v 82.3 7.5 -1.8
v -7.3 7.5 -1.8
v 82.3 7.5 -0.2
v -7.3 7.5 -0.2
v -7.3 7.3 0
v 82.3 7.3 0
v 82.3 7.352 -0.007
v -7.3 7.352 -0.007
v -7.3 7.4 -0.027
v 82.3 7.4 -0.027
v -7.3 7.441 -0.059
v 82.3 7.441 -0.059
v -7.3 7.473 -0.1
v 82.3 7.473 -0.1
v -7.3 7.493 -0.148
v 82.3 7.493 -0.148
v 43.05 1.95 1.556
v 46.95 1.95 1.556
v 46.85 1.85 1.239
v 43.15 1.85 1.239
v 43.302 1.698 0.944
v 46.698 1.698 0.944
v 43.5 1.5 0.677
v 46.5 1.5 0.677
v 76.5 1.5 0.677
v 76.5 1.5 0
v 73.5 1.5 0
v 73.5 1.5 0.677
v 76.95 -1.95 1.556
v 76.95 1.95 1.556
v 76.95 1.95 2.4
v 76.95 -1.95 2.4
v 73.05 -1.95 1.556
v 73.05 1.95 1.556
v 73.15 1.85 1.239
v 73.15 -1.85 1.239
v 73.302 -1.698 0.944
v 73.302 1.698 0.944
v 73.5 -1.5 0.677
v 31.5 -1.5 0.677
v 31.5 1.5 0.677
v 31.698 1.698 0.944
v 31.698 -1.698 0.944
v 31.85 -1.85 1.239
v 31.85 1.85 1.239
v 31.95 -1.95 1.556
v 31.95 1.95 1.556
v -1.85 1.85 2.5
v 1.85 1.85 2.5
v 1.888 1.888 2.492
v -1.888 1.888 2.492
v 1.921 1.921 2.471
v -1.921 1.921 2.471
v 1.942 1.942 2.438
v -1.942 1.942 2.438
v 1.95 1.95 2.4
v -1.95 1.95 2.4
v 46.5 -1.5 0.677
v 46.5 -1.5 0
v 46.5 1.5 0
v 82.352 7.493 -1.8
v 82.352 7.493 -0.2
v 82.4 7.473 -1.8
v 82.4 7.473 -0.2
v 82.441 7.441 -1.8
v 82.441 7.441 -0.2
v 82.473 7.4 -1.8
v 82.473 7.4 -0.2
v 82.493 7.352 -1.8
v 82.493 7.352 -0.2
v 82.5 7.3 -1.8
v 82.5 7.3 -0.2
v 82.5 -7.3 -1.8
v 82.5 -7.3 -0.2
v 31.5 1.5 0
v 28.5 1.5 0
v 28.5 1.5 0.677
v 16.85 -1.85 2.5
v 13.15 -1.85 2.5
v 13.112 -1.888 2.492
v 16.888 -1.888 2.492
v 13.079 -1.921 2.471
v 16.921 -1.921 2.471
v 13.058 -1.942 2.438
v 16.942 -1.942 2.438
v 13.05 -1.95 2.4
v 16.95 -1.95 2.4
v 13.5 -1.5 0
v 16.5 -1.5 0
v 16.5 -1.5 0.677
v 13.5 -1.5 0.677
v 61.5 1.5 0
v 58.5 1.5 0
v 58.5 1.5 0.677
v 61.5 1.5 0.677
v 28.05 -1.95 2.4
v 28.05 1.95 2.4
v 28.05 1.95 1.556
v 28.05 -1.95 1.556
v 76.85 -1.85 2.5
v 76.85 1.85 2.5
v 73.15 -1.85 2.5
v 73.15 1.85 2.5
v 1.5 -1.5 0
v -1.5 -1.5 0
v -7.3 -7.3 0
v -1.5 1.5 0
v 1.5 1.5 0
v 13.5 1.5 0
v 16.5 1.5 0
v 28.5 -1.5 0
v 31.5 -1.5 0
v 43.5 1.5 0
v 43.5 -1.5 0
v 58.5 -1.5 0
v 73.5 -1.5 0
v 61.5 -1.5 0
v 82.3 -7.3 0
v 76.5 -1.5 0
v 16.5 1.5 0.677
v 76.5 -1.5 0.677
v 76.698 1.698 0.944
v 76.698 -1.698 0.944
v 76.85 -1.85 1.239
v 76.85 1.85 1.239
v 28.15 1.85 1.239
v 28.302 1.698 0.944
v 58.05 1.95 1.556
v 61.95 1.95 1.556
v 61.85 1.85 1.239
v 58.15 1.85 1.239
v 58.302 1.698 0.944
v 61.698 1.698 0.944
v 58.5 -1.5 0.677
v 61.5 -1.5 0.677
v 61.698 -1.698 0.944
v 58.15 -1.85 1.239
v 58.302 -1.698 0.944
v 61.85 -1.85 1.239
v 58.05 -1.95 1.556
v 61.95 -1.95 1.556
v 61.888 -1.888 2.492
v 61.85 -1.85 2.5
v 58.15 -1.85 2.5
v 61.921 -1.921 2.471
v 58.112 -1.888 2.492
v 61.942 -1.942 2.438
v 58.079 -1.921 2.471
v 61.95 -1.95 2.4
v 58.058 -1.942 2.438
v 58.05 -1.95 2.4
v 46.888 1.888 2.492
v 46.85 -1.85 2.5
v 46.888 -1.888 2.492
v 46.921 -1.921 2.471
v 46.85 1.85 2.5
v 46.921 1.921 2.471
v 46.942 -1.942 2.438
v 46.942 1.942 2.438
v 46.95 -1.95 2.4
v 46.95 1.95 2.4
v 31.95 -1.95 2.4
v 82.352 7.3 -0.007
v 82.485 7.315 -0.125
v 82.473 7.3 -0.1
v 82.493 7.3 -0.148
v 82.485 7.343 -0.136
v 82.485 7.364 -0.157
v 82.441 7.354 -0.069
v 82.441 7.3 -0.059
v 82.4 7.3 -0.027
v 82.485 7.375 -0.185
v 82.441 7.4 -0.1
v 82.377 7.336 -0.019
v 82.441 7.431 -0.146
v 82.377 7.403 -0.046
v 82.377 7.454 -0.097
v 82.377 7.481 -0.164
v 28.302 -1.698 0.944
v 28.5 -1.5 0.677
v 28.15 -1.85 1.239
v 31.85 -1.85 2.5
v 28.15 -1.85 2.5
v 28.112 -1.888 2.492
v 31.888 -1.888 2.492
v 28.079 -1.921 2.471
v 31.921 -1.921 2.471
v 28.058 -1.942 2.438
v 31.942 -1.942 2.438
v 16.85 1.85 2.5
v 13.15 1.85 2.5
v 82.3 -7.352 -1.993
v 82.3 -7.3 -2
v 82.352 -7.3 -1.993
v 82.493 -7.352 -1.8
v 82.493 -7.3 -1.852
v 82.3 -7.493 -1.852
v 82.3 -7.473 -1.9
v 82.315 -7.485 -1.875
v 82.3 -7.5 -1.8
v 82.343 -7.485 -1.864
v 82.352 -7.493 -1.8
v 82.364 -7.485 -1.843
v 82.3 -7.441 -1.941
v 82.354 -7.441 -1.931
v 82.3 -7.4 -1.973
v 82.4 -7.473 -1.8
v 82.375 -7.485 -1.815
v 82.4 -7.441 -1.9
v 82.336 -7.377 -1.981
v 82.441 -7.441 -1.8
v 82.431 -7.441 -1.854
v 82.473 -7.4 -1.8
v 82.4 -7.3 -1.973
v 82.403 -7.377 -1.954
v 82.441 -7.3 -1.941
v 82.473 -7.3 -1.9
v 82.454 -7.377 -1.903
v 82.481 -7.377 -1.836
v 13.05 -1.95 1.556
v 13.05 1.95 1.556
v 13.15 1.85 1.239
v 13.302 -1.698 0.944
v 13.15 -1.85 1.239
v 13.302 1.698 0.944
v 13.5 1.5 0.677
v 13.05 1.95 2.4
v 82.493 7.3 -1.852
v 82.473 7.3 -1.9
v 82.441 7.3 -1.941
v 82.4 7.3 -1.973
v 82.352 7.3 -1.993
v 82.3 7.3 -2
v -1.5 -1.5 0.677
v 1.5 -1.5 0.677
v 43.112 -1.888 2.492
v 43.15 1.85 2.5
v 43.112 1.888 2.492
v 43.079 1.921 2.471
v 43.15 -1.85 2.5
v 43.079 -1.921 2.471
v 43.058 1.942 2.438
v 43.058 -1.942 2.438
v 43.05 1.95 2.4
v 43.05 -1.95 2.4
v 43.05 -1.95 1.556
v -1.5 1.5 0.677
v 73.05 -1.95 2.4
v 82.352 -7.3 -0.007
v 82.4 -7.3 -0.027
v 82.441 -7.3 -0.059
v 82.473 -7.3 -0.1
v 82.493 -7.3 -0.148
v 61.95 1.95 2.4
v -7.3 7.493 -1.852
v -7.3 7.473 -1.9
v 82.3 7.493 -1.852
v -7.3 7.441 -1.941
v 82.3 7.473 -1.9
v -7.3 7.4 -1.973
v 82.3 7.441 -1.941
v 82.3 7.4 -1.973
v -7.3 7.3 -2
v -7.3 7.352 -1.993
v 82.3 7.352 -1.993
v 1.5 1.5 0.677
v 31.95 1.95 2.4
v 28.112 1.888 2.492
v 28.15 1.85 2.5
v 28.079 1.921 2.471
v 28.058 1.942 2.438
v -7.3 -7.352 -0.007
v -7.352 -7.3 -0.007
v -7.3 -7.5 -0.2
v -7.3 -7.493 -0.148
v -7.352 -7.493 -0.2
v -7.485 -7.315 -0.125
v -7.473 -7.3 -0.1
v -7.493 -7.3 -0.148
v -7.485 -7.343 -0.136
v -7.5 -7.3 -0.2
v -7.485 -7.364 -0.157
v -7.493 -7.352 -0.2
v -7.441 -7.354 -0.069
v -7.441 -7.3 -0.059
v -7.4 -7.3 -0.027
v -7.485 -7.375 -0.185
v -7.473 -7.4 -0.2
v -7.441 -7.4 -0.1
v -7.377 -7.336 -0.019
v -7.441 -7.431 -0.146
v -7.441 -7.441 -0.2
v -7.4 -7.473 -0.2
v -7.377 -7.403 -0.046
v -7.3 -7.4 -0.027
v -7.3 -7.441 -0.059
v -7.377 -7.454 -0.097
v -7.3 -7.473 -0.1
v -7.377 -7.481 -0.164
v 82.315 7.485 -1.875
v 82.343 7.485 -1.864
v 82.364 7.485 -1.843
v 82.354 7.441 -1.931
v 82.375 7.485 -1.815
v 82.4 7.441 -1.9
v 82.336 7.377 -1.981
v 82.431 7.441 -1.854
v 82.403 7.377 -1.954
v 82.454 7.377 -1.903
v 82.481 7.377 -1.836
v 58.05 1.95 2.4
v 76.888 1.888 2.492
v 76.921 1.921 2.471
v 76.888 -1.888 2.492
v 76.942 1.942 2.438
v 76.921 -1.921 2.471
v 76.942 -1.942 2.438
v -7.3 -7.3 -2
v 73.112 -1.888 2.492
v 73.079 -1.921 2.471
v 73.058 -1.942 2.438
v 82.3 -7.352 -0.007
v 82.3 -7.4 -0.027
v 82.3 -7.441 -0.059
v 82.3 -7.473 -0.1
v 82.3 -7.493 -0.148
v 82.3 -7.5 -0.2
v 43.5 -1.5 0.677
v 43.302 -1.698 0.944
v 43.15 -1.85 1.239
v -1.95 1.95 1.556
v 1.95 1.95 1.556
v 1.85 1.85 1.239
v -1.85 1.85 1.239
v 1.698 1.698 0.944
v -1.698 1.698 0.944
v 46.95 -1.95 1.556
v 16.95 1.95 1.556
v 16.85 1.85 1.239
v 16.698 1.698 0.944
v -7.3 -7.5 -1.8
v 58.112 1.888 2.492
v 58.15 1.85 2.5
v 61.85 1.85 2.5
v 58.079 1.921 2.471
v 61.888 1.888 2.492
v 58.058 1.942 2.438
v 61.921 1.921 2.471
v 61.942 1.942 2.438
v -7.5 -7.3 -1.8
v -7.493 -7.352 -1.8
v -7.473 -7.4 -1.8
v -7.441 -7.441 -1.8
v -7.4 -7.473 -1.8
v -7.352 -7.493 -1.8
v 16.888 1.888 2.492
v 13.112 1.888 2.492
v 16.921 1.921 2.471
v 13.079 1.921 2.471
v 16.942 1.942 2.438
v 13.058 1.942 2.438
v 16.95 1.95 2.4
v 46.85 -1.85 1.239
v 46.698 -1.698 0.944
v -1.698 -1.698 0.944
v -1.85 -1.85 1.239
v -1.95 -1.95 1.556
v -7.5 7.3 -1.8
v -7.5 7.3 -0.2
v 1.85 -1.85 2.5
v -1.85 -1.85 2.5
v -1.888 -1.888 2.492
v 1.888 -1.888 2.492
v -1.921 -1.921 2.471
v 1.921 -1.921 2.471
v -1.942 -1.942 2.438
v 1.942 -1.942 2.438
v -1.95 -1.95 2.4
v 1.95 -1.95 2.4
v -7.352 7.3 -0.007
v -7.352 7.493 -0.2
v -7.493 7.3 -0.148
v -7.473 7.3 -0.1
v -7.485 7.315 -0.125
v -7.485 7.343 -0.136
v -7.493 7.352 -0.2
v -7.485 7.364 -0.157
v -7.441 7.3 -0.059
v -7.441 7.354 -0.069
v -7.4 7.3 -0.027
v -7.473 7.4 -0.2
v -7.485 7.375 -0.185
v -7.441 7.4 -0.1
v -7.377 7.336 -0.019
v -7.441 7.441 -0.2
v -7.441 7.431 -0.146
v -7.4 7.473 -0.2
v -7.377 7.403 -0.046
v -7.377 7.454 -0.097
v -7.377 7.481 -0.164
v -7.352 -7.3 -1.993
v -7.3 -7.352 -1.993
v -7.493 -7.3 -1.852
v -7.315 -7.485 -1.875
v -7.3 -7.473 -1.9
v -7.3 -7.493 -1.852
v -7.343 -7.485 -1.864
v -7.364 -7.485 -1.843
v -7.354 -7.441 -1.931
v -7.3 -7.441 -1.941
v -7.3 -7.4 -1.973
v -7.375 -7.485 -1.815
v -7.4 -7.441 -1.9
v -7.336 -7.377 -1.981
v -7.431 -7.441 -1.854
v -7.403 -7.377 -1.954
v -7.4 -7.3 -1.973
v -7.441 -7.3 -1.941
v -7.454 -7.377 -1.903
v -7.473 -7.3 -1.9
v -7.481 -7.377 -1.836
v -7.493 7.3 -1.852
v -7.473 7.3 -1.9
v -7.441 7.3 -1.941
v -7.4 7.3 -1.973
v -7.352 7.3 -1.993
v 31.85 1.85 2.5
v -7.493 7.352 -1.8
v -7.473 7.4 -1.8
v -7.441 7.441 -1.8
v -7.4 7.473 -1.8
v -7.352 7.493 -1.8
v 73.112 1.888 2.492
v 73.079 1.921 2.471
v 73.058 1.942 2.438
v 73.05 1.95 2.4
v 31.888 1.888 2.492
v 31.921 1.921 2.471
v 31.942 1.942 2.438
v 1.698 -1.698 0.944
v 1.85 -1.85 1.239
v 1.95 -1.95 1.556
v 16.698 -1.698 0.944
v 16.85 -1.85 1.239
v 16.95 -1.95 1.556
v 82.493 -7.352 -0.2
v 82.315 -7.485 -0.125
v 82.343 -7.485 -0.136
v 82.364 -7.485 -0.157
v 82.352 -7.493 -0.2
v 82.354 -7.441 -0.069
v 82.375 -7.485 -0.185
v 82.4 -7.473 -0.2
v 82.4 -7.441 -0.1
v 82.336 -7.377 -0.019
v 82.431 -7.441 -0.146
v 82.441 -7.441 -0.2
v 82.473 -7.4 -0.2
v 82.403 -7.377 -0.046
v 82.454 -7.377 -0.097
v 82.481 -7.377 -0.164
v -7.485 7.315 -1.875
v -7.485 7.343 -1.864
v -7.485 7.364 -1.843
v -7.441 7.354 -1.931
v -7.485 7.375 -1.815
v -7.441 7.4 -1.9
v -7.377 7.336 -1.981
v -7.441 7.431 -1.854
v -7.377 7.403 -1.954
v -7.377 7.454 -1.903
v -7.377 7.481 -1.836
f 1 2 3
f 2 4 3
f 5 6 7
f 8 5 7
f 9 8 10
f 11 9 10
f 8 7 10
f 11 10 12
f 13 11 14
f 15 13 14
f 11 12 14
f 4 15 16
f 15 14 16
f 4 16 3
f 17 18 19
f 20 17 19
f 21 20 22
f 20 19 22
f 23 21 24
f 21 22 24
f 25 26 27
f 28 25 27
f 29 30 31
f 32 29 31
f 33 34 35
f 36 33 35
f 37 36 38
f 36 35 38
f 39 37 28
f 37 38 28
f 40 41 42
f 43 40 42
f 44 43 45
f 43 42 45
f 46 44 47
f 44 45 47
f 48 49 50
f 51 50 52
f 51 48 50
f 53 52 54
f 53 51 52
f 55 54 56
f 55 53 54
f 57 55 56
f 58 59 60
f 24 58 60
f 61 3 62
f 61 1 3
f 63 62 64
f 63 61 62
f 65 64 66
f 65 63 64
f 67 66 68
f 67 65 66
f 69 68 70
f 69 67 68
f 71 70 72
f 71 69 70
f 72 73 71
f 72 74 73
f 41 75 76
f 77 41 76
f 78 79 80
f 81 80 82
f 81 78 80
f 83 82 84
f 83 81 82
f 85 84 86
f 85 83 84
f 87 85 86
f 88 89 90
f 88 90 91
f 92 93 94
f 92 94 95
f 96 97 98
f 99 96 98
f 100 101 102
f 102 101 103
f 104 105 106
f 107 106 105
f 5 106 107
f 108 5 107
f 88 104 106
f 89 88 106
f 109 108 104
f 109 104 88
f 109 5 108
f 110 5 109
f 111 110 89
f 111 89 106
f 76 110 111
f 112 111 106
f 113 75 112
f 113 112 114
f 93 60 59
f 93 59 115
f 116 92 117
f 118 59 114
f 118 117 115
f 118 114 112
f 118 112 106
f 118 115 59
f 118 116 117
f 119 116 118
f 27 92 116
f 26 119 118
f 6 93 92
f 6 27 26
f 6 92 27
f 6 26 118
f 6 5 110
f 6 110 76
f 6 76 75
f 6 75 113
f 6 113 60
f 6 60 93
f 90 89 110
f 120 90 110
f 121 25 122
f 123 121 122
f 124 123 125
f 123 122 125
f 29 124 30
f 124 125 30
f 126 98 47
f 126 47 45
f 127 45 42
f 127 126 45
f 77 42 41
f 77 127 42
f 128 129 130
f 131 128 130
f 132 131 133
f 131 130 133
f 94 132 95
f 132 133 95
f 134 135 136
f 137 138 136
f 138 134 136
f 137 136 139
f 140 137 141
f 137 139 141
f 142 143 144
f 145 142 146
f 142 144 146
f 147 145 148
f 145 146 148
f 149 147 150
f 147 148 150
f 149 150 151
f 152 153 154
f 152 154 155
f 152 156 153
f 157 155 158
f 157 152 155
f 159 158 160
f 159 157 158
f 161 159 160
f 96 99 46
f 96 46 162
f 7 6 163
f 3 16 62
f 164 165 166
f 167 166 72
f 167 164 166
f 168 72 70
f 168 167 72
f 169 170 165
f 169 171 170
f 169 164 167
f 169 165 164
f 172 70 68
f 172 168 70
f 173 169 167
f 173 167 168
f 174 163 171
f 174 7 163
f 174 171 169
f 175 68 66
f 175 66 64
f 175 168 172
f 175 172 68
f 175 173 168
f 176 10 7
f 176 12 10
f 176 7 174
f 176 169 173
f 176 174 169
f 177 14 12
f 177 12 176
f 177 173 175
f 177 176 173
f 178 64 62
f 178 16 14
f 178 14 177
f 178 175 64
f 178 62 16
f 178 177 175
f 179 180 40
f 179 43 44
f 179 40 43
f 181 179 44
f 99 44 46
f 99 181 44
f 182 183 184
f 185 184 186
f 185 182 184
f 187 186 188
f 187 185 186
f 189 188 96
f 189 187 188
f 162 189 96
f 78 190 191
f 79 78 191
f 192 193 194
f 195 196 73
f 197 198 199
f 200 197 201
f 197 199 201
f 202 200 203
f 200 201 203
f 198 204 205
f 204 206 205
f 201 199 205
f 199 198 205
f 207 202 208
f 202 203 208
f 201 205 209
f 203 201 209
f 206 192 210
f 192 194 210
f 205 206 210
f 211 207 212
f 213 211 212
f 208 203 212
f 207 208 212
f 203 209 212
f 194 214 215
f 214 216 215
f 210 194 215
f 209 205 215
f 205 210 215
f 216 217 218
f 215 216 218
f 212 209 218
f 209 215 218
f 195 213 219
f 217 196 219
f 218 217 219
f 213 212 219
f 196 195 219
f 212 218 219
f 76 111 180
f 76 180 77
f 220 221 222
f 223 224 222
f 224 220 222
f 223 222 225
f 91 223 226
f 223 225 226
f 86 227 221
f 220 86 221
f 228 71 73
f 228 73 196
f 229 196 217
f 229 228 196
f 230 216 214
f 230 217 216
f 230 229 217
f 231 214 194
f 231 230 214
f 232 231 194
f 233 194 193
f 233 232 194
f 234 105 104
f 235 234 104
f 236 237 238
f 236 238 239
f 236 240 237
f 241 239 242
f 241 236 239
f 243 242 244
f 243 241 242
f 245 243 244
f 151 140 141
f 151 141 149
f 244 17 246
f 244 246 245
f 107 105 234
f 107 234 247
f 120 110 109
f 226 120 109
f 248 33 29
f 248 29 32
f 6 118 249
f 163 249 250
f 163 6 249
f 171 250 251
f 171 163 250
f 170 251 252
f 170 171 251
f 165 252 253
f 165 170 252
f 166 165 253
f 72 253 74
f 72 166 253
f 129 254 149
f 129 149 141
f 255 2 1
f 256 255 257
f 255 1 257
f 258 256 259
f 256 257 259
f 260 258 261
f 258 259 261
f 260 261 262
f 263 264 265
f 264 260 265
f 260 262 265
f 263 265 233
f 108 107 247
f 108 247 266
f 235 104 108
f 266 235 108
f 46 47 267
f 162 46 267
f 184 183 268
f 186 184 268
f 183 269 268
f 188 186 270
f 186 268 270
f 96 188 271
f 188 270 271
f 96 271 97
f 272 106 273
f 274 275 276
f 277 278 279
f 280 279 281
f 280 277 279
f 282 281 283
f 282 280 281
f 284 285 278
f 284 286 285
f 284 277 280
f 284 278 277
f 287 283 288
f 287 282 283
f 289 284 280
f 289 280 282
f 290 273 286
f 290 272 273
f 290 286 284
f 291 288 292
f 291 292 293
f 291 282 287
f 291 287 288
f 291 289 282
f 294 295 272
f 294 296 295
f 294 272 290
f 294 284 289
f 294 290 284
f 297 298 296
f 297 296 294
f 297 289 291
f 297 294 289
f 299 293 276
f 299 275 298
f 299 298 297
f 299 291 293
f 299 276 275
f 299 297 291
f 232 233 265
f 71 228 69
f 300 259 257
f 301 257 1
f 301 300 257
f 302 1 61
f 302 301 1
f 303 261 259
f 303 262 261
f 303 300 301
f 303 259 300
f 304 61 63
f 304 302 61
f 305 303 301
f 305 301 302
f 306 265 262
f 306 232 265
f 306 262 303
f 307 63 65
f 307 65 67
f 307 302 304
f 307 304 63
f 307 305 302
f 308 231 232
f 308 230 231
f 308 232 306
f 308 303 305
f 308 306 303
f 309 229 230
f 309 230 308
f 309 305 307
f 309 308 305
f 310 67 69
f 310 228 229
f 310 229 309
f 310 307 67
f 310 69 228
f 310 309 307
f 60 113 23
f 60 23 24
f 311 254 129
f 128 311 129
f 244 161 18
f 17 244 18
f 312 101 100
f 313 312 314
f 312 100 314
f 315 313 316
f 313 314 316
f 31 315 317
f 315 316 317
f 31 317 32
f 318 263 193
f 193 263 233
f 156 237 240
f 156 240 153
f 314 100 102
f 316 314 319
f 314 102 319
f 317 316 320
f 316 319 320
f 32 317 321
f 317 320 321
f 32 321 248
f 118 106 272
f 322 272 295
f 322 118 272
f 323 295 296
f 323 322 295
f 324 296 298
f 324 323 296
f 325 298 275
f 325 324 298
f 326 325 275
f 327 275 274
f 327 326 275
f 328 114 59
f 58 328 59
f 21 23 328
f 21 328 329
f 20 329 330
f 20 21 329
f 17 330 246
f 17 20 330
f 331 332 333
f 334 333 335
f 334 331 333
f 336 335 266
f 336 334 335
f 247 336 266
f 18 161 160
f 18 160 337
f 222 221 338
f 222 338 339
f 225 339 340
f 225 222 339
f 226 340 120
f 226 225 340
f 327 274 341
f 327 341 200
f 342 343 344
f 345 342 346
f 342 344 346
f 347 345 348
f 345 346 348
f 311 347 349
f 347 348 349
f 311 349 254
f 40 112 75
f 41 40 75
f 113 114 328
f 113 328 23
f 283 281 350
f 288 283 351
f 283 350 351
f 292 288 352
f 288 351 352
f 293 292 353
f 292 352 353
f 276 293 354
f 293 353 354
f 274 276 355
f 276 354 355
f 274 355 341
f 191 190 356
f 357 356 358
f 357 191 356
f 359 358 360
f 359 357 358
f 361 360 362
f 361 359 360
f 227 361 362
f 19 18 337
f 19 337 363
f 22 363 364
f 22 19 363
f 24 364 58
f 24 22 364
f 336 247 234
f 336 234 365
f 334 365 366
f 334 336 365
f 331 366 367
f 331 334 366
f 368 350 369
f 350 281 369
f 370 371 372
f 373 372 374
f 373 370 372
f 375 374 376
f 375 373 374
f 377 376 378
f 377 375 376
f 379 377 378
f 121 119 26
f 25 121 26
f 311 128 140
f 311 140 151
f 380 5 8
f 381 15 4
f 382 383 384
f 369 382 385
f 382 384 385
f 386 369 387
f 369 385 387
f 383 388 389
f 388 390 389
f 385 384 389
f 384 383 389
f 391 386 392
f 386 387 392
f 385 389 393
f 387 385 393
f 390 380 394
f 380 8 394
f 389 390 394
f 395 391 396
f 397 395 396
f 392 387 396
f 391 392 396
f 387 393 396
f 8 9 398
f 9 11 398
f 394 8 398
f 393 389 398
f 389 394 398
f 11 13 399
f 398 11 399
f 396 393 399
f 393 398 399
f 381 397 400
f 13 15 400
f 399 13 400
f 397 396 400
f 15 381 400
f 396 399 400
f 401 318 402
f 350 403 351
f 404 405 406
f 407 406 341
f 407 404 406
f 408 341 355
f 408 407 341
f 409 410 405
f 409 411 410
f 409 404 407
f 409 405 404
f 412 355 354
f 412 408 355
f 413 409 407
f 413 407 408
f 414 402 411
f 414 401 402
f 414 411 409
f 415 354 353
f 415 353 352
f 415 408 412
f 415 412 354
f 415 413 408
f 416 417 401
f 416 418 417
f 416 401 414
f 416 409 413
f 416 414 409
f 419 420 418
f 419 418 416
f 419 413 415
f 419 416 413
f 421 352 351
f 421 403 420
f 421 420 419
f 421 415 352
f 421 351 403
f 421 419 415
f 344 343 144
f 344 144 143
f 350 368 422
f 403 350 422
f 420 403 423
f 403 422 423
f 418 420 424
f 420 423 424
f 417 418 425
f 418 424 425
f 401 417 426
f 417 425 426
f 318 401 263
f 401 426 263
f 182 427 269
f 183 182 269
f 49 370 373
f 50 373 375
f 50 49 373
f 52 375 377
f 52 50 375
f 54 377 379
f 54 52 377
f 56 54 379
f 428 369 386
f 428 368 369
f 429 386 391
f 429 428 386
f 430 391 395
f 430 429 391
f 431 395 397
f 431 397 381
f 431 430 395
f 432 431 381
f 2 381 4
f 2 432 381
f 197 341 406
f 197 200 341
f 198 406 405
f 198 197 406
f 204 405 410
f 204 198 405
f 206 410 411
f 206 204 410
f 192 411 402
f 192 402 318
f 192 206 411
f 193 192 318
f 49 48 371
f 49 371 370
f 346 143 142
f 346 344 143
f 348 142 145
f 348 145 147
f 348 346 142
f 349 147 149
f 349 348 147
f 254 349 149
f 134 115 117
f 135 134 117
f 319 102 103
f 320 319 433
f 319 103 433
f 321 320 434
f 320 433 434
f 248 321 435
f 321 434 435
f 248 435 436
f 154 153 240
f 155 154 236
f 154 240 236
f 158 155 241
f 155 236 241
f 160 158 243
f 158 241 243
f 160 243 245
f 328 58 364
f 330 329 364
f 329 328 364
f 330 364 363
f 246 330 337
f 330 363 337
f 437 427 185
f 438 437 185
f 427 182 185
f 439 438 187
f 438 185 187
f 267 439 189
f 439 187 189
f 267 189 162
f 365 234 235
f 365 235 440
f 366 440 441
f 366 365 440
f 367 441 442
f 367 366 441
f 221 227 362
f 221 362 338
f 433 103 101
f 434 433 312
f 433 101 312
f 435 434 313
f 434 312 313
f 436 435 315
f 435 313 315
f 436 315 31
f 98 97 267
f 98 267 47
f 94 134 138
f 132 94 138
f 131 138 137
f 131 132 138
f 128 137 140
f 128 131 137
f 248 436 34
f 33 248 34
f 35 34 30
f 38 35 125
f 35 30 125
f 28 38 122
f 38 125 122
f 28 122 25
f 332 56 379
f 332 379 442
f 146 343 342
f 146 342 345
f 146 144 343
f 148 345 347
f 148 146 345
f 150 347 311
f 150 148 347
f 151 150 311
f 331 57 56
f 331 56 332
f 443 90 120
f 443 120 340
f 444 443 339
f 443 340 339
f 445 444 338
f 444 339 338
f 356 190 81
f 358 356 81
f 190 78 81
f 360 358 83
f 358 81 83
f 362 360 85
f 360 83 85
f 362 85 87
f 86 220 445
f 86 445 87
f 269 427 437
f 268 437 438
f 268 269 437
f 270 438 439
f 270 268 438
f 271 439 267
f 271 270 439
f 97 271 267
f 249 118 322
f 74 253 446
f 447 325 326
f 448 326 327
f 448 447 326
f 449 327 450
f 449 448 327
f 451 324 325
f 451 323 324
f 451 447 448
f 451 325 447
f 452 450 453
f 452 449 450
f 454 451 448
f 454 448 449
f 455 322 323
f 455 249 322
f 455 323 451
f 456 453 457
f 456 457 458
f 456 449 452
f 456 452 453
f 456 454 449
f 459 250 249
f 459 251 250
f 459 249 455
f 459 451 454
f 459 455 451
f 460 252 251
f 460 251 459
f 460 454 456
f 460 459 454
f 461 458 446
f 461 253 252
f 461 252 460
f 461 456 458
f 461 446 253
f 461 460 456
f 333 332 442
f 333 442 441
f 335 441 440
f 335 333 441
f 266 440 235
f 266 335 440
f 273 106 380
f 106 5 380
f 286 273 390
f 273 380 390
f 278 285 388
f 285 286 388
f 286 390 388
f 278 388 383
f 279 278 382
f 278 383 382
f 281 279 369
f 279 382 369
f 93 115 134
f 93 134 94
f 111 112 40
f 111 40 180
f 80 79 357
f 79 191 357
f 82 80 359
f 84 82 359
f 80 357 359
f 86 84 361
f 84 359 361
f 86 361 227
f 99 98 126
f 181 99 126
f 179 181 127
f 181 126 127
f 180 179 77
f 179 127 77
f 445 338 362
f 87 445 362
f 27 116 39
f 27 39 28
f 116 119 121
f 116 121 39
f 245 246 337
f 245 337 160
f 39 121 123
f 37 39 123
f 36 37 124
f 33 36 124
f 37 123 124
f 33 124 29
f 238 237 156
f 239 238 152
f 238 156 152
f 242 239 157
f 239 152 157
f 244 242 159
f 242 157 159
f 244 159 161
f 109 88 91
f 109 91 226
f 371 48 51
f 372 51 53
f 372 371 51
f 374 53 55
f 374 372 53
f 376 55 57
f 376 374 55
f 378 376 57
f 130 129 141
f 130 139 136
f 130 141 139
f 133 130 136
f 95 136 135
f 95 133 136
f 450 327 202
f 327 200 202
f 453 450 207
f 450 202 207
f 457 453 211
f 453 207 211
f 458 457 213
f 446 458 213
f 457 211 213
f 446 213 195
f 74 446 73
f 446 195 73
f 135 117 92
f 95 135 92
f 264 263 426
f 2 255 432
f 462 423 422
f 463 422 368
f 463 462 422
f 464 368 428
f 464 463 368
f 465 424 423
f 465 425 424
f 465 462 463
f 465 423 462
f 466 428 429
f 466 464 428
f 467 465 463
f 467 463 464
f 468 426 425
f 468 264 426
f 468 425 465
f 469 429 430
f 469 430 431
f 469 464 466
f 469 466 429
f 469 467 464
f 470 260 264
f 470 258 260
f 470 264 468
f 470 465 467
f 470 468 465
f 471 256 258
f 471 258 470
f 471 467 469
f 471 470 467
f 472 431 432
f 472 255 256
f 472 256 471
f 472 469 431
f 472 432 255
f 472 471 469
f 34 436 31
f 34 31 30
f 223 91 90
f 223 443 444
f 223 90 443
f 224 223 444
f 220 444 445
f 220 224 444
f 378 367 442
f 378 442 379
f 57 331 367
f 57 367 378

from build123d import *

# Parameters (mm, degrees)
SKETCH_1_W                      = 90
SKETCH_1_H                      = 15
EXTRUDE_1_DEPTH                 = 2
SKETCH_2_W                      = 3
SKETCH_2_H                      = 3
EXTRUDE_2_DEPTH                 = 1
EXTRUDE_3_DEPTH                 = 2
CUT_EXTRUDE_1_REACH             = 84.878
CUT_EXTRUDE_1_DIRECTION_2_REACH = 84.878
FILLET_1_R                      = 0.1
FILLET_1_OF_MIRROR_1_R          = 0.1
FILLET_1_OF_MIRROR_3_R          = 0.1
FILLET_2_R                      = 0.2


# Read off the part's stored shape, not the designer's step: 镜向4
with BuildPart() as part:
    # 草图1 → 凸台-拉伸1 (new body)
    with BuildSketch(Plane.XY):
        with Locations((37.5, 0)):
            Rectangle(SKETCH_1_W, SKETCH_1_H)
    extrude(amount=-EXTRUDE_1_DEPTH)

    # 草图2 → 凸台-拉伸2 (add)
    with BuildSketch(Plane.XY):
        Rectangle(SKETCH_2_W, SKETCH_2_H)
    extrude_2 = extrude(amount=EXTRUDE_2_DEPTH)

    # 草图3 → 凸台-拉伸3 (add, symmetric)
    with BuildSketch(Plane(origin=(0, 0, 0), x_dir=(1, 0, 0), z_dir=(0, 1, 0))):
        with BuildLine():
            Line((-1.95, -2.5), (1.95, -2.5))
            Line((1.95, -2.5), (1.95, -1.555590279))
            ThreePointArc((1.95, -1.555590279), (1.780042303, -1.088161527), (1.5, -0.677124344))
            Line((1.5, -0.677124344), (-1.5, -0.677124344))
            ThreePointArc((-1.5, -0.677124344), (-1.780042303, -1.088161527), (-1.95, -1.555590279))
            Line((-1.95, -1.555590279), (-1.95, -2.5))
        make_face()
    extrude_3 = extrude(amount=EXTRUDE_3_DEPTH, both=True)

    # 草图4 → 切除-拉伸1 (cut, up to next)
    with BuildSketch(Plane(origin=(0, 0, 0), x_dir=(0, 0, -1), z_dir=(1, 0, 0)), mode=Mode.PRIVATE) as cut_extrude_1_sk1:
        with BuildLine():
            Line((-2.5, 1.95), (-1.555590279, 1.95))
            ThreePointArc((-1.555590279, 1.95), (-1.088161527, 1.780042303), (-0.677124344, 1.5))
            Line((-0.677124344, 1.5), (-0.677124344, 2))
            Line((-0.677124344, 2), (-2.5, 2))
            Line((-2.5, 2), (-2.5, 1.95))
        make_face()
    cut_extrude_1_tool1 = extrude(cut_extrude_1_sk1.sketch, amount=-CUT_EXTRUDE_1_REACH, mode=Mode.PRIVATE) & part.part
    # 草图4 → 切除-拉伸1 (cut, up to next)
    with BuildSketch(Plane(origin=(0, 0, 0), x_dir=(0, 0, -1), z_dir=(1, 0, 0)), mode=Mode.PRIVATE) as cut_extrude_1_sk2:
        with BuildLine():
            Line((-2.5, -2), (-0.677124344, -2))
            Line((-0.677124344, -2), (-0.677124344, -1.5))
            ThreePointArc((-0.677124344, -1.5), (-1.088161527, -1.780042303), (-1.555590279, -1.95))
            Line((-1.555590279, -1.95), (-2.5, -1.95))
            Line((-2.5, -1.95), (-2.5, -2))
        make_face()
    cut_extrude_1_tool2 = extrude(cut_extrude_1_sk2.sketch, amount=-CUT_EXTRUDE_1_REACH, mode=Mode.PRIVATE) & part.part
    cut_extrude_1_1 = cut_extrude_1_tool1.solids().sort_by_distance((0, 1.873038, 1.175075))[0]
    add(cut_extrude_1_1, mode=Mode.SUBTRACT)
    cut_extrude_1_2 = cut_extrude_1_tool2.solids().sort_by_distance((0, -1.873038, 1.175075))[0]
    add(cut_extrude_1_2, mode=Mode.SUBTRACT)
    cut_extrude_1 = cut_extrude_1_1 + cut_extrude_1_2  # 切除-拉伸1 as one shape, for the pattern or mirror that repeats it

    # 草图4 → 切除-拉伸1 direction 2 (cut, up to next)
    with BuildSketch(Plane(origin=(0, 0, 0), x_dir=(0, 0, -1), z_dir=(1, 0, 0)), mode=Mode.PRIVATE) as cut_extrude_1_direction_2_sk1:
        with BuildLine():
            Line((-2.5, 1.95), (-1.555590279, 1.95))
            ThreePointArc((-1.555590279, 1.95), (-1.088161527, 1.780042303), (-0.677124344, 1.5))
            Line((-0.677124344, 1.5), (-0.677124344, 2))
            Line((-0.677124344, 2), (-2.5, 2))
            Line((-2.5, 2), (-2.5, 1.95))
        make_face()
    cut_extrude_1_direction_2_tool1 = extrude(cut_extrude_1_direction_2_sk1.sketch, amount=CUT_EXTRUDE_1_DIRECTION_2_REACH, mode=Mode.PRIVATE) & part.part
    # 草图4 → 切除-拉伸1 direction 2 (cut, up to next)
    with BuildSketch(Plane(origin=(0, 0, 0), x_dir=(0, 0, -1), z_dir=(1, 0, 0)), mode=Mode.PRIVATE) as cut_extrude_1_direction_2_sk2:
        with BuildLine():
            Line((-2.5, -2), (-0.677124344, -2))
            Line((-0.677124344, -2), (-0.677124344, -1.5))
            ThreePointArc((-0.677124344, -1.5), (-1.088161527, -1.780042303), (-1.555590279, -1.95))
            Line((-1.555590279, -1.95), (-2.5, -1.95))
            Line((-2.5, -1.95), (-2.5, -2))
        make_face()
    cut_extrude_1_direction_2_tool2 = extrude(cut_extrude_1_direction_2_sk2.sketch, amount=CUT_EXTRUDE_1_DIRECTION_2_REACH, mode=Mode.PRIVATE) & part.part
    cut_extrude_1_direction_2_1 = cut_extrude_1_direction_2_tool1.solids().sort_by_distance((0, 1.873038, 1.175075))[0]
    add(cut_extrude_1_direction_2_1, mode=Mode.SUBTRACT)
    cut_extrude_1_direction_2_2 = cut_extrude_1_direction_2_tool2.solids().sort_by_distance((0, -1.873038, 1.175075))[0]
    add(cut_extrude_1_direction_2_2, mode=Mode.SUBTRACT)
    cut_extrude_1_direction_2 = cut_extrude_1_direction_2_1 + cut_extrude_1_direction_2_2  # 切除-拉伸1 direction 2 as one shape, for the pattern or mirror that repeats it

    # 圆角1
    fillet_1_edges = [part.edges().sort_by_distance(p)[0] for p in [
        (-1.95, 0, 2.5),
        (1.95, 0, 2.5),
        (0, -1.95, 2.5),
        (0, 1.95, 2.5),
    ]]
    fillet(fillet_1_edges, radius=FILLET_1_R)

    # 镜向1: 凸台-拉伸2, 凸台-拉伸3, 切除-拉伸1, 切除-拉伸1 direction 2 across plane
    add(extrude_2.mirror(Plane(origin=(7.5, 0, 0), x_dir=(0, 0, 1), z_dir=(1, 0, 0))))
    add(extrude_3.mirror(Plane(origin=(7.5, 0, 0), x_dir=(0, 0, 1), z_dir=(1, 0, 0))))
    add(cut_extrude_1.mirror(Plane(origin=(7.5, 0, 0), x_dir=(0, 0, 1), z_dir=(1, 0, 0))), mode=Mode.SUBTRACT)
    add(cut_extrude_1_direction_2.mirror(Plane(origin=(7.5, 0, 0), x_dir=(0, 0, 1), z_dir=(1, 0, 0))), mode=Mode.SUBTRACT)

    # 圆角1 of 镜向1
    fillet_1_of_mirror_1_edges = [part.edges().sort_by_distance(p)[0] for p in [
        (16.95, 0, 2.5),
        (13.05, 0, 2.5),
        (15, -1.95, 2.5),
        (15, 1.95, 2.5),
    ]]
    fillet(fillet_1_of_mirror_1_edges, radius=FILLET_1_OF_MIRROR_1_R)

    # 镜向3: 凸台-拉伸2, 凸台-拉伸3, 切除-拉伸1, 切除-拉伸1 direction 2 across plane
    add(extrude_2.mirror(Plane(origin=(15, 0, 0), x_dir=(0, 0, 1), z_dir=(1, 0, 0))))
    add(extrude_3.mirror(Plane(origin=(15, 0, 0), x_dir=(0, 0, 1), z_dir=(1, 0, 0))))
    add(cut_extrude_1.mirror(Plane(origin=(15, 0, 0), x_dir=(0, 0, 1), z_dir=(1, 0, 0))), mode=Mode.SUBTRACT)
    add(cut_extrude_1_direction_2.mirror(Plane(origin=(15, 0, 0), x_dir=(0, 0, 1), z_dir=(1, 0, 0))), mode=Mode.SUBTRACT)

    # 圆角1 of 镜向3
    fillet_1_of_mirror_3_edges = [part.edges().sort_by_distance(p)[0] for p in [
        (31.95, 0, 2.5),
        (28.05, 0, 2.5),
        (30, -1.95, 2.5),
        (30, 1.95, 2.5),
    ]]
    fillet(fillet_1_of_mirror_3_edges, radius=FILLET_1_OF_MIRROR_3_R)

    # 镜向4: part across plane


with BuildPart() as part_1:
    add(part.part)
    add(part.part.mirror(Plane(origin=(37.5, 0, 0), x_dir=(0, 0, 1), z_dir=(1, 0, 0))))

    # 圆角2
    fillet_2_edges = [part_1.edges().sort_by_distance(p)[0] for p in [
        (82.5, 0, -2),
        (37.5, 7.5, -2),
        (-7.5, 0, -2),
        (37.5, 7.5, 0),
        (82.5, 0, 0),
        (37.5, -7.5, 0),
        (-7.5, 0, 0),
        (37.5, -7.5, -2),
        (-7.5, 7.5, -1),
        (82.5, 7.5, -1),
        (82.5, -7.5, -1),
        (-7.5, -7.5, -1),
    ]]
    fillet(fillet_2_edges, radius=FILLET_2_R)


solid = part_1.part
